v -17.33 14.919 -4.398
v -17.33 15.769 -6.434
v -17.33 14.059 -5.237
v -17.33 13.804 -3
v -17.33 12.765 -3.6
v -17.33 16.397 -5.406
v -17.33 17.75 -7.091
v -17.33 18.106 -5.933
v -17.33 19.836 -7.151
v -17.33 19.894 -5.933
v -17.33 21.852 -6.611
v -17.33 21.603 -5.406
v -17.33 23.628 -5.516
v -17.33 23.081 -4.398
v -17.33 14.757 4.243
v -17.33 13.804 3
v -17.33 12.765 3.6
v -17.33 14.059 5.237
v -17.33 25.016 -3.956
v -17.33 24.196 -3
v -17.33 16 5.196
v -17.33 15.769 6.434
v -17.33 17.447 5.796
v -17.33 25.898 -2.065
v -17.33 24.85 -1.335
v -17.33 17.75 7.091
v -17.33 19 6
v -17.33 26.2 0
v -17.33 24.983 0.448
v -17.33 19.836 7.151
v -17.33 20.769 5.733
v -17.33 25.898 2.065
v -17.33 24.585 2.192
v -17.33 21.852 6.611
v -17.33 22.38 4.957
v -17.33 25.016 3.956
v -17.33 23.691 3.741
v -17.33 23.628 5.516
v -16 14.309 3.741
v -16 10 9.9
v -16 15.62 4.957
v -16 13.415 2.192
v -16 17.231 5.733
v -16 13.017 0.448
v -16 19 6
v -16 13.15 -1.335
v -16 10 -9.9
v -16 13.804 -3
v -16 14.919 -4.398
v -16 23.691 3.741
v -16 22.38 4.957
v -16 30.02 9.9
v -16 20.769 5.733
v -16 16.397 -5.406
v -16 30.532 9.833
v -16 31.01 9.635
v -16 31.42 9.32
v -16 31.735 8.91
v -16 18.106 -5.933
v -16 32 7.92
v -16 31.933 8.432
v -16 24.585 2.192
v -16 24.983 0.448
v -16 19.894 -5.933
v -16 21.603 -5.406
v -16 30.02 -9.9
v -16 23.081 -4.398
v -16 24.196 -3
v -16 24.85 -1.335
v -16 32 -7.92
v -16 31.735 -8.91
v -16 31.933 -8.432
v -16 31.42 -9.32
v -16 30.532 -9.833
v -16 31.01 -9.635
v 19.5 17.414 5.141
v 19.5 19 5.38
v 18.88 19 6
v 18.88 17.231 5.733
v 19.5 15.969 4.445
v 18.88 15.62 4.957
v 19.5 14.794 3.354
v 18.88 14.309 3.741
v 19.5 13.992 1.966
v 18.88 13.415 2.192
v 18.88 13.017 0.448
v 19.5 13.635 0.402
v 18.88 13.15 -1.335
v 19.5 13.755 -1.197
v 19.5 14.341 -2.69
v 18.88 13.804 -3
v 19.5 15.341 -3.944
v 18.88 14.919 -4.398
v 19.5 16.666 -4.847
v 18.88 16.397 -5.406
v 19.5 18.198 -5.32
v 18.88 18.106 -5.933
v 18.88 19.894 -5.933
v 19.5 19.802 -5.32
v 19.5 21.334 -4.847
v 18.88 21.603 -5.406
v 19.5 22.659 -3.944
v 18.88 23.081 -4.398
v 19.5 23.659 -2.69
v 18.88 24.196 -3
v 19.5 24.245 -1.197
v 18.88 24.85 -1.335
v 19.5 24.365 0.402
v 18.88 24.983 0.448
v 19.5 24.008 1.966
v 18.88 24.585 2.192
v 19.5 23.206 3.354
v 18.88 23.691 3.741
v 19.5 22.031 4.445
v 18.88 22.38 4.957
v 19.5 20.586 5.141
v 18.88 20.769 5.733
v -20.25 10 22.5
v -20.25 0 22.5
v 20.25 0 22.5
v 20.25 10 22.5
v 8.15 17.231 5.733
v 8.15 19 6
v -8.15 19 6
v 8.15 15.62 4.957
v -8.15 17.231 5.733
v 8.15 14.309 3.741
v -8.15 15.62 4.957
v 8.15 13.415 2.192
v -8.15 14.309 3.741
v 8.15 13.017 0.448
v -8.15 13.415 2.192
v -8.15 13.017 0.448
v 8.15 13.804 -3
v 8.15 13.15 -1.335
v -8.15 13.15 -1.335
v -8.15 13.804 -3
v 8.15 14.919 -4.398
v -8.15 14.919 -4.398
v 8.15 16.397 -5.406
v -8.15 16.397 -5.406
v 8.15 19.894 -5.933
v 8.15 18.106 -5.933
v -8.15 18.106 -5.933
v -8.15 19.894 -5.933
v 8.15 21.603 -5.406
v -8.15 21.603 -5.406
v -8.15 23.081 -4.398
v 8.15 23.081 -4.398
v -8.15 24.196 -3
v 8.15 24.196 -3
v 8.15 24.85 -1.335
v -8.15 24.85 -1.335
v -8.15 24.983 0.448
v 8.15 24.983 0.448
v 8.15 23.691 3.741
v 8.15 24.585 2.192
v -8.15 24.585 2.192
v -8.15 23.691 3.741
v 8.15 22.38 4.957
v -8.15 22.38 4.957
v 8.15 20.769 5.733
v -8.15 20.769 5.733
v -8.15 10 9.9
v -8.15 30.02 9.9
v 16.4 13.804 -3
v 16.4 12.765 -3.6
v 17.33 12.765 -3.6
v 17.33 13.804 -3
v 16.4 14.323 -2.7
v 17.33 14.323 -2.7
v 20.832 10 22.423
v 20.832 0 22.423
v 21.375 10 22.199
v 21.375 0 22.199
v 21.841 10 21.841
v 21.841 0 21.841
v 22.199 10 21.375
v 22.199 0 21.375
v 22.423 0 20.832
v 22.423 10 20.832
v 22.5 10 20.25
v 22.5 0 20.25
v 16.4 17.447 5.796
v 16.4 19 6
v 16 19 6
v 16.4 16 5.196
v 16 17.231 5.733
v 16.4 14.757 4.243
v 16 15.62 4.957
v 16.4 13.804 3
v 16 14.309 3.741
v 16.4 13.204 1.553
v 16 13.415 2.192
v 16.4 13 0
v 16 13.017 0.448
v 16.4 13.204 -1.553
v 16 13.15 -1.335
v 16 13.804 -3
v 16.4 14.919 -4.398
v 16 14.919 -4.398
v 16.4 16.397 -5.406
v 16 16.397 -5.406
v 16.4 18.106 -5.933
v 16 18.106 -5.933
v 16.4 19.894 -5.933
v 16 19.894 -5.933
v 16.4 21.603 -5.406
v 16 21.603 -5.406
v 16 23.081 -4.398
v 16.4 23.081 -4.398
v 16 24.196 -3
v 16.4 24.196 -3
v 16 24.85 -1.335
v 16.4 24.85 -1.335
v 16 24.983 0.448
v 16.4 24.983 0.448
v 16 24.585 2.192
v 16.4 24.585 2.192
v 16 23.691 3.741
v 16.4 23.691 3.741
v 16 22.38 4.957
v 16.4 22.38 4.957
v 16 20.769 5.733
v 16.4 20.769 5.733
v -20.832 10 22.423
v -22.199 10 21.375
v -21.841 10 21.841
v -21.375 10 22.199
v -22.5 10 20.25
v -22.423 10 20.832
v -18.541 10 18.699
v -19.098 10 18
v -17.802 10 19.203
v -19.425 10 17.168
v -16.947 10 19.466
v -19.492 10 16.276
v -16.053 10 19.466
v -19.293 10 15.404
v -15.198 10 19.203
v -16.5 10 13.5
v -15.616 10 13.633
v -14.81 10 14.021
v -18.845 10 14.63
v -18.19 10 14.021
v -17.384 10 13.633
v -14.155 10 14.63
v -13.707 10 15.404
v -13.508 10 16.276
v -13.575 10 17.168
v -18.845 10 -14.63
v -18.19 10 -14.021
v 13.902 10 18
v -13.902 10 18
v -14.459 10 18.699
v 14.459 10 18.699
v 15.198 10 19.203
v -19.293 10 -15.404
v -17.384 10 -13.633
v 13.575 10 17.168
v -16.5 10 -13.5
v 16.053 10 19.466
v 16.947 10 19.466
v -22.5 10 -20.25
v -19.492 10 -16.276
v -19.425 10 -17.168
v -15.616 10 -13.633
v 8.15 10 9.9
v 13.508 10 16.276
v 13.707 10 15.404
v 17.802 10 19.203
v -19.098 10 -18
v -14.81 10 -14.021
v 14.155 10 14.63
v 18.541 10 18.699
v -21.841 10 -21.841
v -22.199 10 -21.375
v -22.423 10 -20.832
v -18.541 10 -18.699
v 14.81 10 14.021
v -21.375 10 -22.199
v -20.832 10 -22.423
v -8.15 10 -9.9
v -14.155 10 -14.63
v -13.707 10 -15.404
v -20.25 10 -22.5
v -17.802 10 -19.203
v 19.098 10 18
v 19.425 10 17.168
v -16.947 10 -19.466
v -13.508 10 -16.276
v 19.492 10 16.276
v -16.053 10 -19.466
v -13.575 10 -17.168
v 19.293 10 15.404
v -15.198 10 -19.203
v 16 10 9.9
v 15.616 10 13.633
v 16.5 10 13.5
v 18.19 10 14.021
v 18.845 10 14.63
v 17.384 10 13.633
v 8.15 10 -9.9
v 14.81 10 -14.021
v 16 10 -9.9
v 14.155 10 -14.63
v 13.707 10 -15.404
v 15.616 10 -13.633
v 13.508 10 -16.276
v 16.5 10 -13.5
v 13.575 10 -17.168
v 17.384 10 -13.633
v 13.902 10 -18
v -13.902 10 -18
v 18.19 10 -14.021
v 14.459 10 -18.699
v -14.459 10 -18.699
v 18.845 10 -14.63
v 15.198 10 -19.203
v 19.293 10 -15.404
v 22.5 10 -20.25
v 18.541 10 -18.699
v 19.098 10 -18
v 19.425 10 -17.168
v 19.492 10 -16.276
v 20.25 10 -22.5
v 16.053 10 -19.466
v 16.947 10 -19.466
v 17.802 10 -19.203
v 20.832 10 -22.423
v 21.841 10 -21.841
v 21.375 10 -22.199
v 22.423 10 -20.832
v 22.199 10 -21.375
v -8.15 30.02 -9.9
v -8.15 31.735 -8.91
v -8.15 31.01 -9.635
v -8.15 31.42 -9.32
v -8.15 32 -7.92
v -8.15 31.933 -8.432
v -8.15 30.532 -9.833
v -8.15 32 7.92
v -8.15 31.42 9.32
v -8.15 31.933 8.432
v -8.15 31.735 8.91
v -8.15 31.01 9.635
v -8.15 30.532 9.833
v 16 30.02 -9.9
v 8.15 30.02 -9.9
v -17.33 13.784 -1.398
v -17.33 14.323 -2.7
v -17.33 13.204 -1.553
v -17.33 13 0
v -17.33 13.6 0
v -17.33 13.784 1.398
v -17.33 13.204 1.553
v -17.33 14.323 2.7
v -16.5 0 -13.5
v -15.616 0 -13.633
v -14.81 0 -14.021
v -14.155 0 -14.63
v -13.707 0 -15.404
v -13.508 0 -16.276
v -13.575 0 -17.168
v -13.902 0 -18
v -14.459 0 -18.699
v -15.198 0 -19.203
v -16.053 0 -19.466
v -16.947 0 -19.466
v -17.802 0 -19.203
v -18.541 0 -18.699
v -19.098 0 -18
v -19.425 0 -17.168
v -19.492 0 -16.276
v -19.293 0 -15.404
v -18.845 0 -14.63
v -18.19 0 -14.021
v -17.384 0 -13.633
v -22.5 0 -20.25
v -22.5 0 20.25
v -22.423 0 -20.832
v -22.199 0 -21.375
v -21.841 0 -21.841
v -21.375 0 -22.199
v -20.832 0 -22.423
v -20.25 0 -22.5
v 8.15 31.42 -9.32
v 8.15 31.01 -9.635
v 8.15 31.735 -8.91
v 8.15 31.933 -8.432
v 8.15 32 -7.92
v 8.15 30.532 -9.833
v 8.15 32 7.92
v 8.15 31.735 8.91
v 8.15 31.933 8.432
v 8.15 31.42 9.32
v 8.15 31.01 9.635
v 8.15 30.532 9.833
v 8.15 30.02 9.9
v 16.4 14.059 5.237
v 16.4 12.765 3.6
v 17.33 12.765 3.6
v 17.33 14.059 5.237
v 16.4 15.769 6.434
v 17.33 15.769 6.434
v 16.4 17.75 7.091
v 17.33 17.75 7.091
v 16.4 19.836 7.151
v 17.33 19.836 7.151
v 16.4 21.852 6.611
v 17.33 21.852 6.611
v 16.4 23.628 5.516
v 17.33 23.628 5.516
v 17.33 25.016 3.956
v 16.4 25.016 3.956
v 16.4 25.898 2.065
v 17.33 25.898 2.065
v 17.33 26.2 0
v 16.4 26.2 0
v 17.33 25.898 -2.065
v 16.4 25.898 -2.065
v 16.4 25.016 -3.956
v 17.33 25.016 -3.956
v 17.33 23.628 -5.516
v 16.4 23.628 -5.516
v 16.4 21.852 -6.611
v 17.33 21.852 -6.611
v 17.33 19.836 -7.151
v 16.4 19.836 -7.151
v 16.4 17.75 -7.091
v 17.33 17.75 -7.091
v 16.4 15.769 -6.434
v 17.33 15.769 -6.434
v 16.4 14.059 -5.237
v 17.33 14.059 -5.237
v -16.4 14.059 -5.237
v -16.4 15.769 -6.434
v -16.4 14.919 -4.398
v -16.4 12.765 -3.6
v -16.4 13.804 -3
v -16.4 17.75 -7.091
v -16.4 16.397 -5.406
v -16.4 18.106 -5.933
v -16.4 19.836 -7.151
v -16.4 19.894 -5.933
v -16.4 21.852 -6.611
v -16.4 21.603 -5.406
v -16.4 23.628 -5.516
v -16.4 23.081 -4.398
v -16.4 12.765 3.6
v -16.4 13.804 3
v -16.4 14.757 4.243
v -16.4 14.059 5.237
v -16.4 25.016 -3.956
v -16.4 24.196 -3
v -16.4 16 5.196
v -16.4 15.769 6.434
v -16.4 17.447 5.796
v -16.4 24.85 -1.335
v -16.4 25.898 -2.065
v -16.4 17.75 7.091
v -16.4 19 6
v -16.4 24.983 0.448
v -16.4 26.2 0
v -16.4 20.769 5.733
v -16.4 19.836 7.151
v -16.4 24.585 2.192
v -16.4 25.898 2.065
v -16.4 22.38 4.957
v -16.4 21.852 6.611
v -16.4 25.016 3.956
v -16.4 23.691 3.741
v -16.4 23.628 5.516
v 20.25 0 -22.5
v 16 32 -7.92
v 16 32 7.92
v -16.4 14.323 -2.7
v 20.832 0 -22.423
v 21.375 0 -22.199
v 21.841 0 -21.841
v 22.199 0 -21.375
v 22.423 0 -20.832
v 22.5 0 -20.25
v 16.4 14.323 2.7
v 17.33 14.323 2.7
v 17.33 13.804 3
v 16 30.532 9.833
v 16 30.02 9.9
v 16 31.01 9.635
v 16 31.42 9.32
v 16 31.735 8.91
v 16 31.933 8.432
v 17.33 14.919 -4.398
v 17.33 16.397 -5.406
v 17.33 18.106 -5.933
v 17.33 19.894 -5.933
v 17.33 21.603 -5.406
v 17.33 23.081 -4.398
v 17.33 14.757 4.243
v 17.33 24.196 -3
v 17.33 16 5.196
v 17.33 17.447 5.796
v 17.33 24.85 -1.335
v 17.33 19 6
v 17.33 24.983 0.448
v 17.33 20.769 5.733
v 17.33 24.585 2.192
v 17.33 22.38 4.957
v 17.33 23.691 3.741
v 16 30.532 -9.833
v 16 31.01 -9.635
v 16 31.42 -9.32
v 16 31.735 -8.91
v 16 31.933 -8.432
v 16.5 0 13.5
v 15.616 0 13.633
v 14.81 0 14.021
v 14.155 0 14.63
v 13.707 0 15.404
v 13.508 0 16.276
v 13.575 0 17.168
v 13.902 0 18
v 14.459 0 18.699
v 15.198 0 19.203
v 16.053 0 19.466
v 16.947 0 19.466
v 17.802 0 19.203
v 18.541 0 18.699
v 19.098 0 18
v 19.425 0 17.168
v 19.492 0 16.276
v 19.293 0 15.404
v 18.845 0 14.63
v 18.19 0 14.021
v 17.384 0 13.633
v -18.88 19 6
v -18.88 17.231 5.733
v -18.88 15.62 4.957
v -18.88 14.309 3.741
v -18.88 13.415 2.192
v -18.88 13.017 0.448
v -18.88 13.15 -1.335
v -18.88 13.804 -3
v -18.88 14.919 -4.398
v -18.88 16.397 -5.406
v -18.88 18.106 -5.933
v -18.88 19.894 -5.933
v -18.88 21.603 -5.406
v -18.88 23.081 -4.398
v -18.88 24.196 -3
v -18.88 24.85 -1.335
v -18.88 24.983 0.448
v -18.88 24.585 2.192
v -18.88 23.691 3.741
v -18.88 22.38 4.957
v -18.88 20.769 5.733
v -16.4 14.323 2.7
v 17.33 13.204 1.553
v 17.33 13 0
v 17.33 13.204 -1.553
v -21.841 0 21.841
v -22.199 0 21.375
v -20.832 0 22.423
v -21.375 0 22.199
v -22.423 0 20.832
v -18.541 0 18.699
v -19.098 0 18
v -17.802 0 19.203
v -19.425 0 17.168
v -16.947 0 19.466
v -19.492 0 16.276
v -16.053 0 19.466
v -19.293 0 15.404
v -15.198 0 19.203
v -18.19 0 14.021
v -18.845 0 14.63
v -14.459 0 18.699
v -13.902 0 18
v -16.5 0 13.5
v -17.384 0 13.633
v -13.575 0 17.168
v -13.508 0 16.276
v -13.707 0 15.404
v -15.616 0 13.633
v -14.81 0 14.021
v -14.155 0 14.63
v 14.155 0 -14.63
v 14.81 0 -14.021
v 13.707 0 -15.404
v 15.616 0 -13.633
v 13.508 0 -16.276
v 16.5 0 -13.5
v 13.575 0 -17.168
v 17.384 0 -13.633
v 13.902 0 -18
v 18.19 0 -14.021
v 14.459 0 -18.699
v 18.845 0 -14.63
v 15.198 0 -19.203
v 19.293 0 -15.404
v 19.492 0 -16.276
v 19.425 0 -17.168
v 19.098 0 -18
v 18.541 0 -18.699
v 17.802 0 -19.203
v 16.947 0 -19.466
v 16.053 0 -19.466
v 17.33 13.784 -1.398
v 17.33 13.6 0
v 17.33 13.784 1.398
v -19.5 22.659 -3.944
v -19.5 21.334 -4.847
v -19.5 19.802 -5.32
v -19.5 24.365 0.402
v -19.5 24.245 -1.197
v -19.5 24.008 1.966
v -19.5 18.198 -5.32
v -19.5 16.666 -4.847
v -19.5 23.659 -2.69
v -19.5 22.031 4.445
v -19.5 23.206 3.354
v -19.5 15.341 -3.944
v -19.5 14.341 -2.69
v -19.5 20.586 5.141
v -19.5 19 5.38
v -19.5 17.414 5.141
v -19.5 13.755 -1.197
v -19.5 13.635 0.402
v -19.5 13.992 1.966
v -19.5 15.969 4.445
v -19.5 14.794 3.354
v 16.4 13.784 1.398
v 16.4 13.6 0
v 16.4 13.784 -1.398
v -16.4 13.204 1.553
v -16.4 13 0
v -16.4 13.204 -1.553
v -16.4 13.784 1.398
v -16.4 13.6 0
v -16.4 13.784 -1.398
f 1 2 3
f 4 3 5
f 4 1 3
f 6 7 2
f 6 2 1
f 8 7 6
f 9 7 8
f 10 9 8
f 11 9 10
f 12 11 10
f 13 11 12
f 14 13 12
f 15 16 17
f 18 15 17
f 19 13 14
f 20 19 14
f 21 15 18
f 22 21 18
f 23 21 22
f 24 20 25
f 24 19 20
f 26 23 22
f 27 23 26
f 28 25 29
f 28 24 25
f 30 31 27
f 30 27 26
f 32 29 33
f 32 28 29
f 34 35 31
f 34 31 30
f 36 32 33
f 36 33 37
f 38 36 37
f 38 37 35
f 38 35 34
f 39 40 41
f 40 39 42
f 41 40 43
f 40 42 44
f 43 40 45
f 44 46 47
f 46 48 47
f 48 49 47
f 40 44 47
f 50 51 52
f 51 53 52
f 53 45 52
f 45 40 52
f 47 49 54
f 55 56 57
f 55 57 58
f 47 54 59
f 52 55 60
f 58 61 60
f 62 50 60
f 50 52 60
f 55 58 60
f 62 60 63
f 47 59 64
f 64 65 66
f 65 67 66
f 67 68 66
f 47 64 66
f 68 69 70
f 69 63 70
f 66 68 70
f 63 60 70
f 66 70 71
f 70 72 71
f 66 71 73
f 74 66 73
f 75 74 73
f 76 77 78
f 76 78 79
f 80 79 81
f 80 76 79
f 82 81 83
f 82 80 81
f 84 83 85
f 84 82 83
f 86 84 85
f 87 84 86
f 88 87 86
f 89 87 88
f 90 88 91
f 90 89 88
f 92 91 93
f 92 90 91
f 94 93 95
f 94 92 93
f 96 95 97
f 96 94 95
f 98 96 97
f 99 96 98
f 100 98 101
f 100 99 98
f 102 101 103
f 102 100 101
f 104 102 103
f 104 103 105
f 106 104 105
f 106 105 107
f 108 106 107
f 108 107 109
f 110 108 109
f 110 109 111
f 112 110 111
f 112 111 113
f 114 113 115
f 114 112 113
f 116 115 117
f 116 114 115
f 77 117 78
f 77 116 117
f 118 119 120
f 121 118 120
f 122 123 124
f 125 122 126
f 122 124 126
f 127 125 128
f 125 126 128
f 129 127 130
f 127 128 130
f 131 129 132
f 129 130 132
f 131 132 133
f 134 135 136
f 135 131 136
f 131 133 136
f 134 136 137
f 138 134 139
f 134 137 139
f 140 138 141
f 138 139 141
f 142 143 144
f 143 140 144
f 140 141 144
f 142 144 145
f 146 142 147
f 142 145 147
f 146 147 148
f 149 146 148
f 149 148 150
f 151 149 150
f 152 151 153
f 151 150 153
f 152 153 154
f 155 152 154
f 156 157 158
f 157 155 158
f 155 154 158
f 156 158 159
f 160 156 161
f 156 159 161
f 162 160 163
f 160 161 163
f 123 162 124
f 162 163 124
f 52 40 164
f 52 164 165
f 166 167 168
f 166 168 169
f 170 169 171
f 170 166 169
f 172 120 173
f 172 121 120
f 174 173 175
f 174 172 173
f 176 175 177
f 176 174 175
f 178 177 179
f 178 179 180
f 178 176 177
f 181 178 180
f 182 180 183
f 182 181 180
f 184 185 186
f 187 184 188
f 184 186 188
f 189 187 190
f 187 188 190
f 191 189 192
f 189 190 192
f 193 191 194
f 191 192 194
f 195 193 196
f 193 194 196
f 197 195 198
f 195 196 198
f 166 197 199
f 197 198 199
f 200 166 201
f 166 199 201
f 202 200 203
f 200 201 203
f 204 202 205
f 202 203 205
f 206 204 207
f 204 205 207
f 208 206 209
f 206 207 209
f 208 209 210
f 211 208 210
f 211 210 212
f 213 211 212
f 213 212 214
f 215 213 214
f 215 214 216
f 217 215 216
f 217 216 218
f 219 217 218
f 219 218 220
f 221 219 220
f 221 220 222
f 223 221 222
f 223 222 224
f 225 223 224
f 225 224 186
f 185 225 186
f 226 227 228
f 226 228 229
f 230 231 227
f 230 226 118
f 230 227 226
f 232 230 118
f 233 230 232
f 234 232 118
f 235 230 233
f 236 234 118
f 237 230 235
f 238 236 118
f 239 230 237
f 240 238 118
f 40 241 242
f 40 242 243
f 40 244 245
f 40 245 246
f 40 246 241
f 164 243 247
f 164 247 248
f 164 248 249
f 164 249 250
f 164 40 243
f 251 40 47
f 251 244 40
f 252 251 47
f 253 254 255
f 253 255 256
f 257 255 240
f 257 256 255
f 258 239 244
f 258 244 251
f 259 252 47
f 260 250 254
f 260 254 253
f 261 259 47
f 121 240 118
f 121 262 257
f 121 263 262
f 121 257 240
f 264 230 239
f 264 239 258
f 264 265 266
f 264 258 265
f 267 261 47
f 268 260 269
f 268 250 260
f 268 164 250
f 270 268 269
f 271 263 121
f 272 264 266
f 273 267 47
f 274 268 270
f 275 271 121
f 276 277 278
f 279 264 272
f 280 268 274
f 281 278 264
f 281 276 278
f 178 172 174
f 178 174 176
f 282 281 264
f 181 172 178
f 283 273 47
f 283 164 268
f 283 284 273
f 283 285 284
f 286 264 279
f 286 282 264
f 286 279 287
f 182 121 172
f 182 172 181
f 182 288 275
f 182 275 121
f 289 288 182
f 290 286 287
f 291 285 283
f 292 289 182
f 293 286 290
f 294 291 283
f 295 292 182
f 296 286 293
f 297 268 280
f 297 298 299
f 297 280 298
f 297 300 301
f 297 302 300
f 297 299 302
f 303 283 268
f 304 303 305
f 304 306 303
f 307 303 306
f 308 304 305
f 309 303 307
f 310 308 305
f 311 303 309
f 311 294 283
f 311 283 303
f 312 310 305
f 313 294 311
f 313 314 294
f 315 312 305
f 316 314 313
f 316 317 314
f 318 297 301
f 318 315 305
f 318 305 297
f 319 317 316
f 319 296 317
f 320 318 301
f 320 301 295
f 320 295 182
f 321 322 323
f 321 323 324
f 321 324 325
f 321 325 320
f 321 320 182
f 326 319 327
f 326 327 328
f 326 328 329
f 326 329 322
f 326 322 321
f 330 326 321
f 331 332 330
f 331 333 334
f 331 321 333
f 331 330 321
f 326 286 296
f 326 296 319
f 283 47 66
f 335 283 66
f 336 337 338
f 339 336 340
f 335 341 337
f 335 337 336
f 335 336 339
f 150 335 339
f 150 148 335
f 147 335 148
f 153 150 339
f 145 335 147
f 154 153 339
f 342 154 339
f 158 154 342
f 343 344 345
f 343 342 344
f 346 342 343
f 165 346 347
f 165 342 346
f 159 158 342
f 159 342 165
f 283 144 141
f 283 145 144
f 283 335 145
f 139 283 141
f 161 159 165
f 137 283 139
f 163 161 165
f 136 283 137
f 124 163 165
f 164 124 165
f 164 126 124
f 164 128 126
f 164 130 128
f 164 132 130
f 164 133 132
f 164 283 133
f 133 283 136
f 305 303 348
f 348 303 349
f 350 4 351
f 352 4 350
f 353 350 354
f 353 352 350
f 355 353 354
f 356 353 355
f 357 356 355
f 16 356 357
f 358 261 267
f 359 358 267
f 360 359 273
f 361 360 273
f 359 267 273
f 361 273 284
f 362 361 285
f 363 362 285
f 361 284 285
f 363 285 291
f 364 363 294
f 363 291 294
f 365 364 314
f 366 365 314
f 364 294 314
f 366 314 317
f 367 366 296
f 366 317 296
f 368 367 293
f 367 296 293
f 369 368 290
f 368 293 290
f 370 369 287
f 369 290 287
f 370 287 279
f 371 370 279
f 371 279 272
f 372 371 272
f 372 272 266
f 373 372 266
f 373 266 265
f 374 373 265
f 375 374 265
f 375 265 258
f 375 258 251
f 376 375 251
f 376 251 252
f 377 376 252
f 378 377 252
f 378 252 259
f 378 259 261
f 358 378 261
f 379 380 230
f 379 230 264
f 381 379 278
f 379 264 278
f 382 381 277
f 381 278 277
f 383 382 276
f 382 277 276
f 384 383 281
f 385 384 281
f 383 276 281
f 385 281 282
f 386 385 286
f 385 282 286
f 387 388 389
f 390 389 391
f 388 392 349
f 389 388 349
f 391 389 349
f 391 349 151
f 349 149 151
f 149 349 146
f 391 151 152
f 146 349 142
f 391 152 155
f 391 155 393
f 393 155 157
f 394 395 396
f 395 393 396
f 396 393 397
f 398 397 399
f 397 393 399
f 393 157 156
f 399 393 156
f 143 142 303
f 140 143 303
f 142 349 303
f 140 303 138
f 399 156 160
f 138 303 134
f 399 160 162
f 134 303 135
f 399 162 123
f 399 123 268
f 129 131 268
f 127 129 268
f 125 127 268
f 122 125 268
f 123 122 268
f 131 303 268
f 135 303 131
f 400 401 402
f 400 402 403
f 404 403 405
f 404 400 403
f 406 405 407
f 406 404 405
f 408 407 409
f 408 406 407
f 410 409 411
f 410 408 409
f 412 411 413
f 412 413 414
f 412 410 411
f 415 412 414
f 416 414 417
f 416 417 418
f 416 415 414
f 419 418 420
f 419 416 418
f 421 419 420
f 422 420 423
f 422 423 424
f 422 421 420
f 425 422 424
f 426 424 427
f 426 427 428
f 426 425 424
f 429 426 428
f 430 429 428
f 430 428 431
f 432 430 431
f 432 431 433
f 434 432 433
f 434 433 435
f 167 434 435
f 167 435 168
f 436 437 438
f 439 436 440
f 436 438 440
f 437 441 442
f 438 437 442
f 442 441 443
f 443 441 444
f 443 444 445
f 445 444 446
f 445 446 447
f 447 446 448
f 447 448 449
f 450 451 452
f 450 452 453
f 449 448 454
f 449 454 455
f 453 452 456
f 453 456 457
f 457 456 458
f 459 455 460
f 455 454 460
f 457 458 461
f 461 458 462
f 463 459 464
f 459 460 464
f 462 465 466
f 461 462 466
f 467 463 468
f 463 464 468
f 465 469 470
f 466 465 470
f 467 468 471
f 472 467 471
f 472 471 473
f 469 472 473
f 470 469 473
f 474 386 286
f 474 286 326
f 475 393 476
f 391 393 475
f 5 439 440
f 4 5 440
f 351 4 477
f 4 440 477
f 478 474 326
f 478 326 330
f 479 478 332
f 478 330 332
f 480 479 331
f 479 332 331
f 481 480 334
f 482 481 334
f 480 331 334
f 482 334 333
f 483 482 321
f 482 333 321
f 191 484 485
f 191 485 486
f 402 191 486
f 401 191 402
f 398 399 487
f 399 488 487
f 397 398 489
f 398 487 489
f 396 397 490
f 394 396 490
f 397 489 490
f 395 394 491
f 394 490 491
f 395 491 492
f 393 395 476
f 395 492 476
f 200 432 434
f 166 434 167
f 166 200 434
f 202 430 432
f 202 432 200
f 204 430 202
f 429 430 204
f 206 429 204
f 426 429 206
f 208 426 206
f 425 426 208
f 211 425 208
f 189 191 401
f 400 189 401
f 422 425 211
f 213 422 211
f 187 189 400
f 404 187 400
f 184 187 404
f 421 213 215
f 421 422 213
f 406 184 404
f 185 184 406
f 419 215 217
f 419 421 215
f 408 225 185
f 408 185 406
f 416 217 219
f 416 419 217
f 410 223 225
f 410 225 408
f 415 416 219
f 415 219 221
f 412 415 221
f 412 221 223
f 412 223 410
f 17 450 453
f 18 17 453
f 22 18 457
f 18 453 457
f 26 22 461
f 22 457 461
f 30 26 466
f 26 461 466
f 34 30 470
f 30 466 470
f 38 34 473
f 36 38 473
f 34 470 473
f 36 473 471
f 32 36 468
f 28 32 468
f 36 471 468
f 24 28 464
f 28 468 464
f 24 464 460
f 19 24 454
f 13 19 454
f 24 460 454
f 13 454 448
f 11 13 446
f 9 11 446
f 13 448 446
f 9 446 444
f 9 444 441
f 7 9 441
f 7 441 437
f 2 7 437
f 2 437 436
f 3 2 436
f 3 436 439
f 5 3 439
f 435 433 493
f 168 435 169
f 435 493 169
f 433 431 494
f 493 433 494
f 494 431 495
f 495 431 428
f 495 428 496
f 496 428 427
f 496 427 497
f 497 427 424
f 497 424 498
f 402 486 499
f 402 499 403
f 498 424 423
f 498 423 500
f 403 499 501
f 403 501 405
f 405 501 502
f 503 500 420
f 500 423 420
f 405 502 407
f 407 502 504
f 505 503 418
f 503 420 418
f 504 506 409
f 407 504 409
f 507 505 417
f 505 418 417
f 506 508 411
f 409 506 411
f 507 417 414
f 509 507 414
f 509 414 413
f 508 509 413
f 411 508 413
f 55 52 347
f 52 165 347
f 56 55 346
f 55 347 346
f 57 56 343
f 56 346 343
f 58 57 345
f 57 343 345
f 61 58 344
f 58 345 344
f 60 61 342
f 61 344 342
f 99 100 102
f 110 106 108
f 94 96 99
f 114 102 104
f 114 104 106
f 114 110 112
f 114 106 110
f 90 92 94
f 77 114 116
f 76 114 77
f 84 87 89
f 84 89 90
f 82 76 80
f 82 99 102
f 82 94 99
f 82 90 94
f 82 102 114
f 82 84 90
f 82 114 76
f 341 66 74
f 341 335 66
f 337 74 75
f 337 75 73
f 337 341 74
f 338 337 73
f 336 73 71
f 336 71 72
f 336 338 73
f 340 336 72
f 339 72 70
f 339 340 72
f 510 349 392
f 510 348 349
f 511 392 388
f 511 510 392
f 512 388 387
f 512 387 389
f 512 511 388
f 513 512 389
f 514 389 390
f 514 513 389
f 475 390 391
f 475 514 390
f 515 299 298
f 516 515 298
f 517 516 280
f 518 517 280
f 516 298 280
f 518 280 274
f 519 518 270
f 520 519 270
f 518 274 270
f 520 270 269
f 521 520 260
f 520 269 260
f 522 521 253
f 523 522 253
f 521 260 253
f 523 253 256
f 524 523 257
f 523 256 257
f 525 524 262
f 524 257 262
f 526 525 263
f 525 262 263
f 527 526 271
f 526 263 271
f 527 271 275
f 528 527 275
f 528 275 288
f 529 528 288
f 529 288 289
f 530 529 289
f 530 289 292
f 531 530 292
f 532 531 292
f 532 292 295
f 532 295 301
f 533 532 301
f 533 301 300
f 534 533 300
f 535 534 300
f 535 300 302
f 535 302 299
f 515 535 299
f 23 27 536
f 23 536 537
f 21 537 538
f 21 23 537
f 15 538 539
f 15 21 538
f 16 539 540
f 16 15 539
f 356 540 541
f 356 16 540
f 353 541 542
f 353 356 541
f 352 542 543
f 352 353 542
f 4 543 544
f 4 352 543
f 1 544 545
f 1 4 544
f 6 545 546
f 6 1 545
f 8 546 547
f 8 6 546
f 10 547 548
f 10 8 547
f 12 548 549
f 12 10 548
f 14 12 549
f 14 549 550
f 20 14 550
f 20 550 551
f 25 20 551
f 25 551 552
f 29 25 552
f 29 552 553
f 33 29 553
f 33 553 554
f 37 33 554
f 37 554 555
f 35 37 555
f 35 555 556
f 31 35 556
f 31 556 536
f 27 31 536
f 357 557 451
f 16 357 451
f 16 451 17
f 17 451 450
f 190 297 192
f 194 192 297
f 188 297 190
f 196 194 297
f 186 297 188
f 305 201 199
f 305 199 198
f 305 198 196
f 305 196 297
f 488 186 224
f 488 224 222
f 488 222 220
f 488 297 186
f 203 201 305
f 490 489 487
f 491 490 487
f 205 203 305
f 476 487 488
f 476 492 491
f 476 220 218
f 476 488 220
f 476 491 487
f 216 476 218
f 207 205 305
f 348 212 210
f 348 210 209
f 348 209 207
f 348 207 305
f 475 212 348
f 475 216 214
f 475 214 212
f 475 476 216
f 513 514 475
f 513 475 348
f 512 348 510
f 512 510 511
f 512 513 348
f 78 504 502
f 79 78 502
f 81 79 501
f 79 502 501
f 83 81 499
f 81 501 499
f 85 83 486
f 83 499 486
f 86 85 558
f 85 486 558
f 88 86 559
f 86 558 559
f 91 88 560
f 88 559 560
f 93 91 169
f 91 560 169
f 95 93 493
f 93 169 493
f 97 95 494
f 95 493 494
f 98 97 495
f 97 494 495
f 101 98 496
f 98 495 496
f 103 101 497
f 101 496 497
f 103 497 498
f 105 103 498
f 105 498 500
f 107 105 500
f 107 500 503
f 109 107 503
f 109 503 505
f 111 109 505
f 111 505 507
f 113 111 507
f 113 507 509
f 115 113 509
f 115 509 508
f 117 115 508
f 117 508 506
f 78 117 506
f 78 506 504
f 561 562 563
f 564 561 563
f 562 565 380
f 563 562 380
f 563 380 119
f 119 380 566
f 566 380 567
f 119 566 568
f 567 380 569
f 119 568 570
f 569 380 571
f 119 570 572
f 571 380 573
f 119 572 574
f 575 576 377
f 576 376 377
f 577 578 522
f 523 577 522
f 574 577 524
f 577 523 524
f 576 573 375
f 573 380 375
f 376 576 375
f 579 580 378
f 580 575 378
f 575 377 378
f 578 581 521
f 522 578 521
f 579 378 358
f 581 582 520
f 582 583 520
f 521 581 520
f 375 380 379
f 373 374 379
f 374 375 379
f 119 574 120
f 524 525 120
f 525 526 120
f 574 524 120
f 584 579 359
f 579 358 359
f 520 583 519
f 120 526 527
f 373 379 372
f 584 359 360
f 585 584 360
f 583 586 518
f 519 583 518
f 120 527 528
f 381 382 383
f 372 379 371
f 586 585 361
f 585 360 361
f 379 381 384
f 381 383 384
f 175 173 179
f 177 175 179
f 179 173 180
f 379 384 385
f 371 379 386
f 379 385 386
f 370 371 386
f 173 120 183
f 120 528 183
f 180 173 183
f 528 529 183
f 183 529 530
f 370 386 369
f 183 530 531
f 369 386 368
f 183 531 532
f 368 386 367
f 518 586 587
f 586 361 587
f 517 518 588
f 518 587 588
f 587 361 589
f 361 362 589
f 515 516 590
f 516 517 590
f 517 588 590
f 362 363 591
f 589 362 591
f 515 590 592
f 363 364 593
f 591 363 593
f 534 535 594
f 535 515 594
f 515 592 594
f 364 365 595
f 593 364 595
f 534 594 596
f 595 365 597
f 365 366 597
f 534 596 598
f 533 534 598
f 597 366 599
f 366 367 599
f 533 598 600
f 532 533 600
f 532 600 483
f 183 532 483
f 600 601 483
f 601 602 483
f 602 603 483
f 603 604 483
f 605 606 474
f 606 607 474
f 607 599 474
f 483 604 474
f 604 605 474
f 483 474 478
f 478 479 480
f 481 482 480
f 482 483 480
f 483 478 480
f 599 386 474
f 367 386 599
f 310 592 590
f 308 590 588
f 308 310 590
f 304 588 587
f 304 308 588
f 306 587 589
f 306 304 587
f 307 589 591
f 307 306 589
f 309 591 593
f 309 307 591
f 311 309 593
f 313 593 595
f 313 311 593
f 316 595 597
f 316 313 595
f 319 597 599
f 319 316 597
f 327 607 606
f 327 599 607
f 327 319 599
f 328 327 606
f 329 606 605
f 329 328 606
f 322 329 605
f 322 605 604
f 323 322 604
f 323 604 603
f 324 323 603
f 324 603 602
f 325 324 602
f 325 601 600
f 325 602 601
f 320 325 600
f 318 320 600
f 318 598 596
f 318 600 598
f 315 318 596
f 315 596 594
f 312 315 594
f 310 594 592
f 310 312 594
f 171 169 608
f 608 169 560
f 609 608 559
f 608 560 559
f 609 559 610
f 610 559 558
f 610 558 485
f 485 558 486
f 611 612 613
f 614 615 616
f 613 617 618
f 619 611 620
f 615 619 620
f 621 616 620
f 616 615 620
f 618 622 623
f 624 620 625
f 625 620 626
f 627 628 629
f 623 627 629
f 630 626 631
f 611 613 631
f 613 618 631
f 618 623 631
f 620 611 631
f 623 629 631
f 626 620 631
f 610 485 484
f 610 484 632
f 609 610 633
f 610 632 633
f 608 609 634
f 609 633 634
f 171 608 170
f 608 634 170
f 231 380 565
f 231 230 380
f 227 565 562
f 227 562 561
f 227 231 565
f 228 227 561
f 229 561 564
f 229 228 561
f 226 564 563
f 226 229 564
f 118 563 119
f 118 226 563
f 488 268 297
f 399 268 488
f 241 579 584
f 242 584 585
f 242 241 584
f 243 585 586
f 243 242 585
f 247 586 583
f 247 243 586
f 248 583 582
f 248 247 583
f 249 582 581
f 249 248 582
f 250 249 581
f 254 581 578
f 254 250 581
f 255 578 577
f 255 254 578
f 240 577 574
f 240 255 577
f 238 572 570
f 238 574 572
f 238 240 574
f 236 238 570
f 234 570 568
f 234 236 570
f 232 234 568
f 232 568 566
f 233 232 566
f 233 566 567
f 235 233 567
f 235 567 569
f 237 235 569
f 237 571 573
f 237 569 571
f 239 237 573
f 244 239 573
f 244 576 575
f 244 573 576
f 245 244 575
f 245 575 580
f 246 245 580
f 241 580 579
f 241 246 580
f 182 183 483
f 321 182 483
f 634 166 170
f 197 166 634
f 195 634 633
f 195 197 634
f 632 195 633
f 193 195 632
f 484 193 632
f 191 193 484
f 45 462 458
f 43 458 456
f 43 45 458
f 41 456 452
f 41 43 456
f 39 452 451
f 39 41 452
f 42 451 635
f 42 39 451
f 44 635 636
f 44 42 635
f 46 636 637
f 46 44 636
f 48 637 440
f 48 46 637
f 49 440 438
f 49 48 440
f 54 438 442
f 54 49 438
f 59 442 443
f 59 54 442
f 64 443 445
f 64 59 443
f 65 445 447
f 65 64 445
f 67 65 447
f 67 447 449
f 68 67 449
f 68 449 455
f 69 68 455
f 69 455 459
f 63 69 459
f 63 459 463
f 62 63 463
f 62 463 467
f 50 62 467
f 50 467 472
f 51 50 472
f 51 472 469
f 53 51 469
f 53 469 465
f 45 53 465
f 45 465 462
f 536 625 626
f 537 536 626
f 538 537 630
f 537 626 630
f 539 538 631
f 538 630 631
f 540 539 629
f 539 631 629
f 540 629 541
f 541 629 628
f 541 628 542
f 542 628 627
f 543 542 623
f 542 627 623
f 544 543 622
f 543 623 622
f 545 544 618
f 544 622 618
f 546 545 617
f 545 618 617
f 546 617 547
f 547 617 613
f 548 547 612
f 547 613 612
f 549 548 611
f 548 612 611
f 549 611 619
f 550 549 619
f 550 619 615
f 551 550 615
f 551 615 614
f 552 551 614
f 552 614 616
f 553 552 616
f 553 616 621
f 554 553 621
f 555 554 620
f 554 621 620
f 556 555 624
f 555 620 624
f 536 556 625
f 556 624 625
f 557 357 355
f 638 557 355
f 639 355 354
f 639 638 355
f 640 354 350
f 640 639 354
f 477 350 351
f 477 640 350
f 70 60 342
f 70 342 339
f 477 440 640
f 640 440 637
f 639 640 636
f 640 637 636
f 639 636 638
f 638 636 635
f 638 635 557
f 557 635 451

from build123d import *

# Parameters (mm, degrees)
SKETCH_3_W               = 45
SKETCH_3_H               = 45
EXTRUDE_1_DEPTH          = 10
EXTRUDE_START            = -38.5
SKETCH_4_W               = 19.8
SKETCH_4_H               = 22
EXTRUDE_2_DEPTH          = 32
SKETCH_5_W               = 16.3
SKETCH_5_H               = 19.8
CUT_EXTRUDE_1_DEPTH      = 22
SKETCH_6_R               = 6
EXTRUDE_3_DEPTH          = 19.5
CUT_EXTRUDE_START        = -3.1
SKETCH_7_R               = 6
SKETCH_7_R_2             = 5.4
CUT_EXTRUDE_3_DEPTH      = 0.93
SKETCH_8_R               = 3
CUT_EXTRUDE_4_DEPTH      = 39.684622268
MIRROR_4_COPY_1_SKETCH_R = 3
MIRROR_4_COPY_1_DEPTH    = 39.684622268
EXTRUDE_4_DEPTH          = 0.93
FILLET_1_R               = 2.25
FILLET_2_R               = 1.98
CHAMFER_1_SIZE           = 0.62


with BuildPart() as part:
    # 草图3 → 凸台-拉伸1 (new body)
    with BuildSketch(Plane(origin=(0, 0, 0), x_dir=(1, 0, 0), z_dir=(0, 1, 0))):
        Rectangle(SKETCH_3_W, SKETCH_3_H)
    extrude(amount=EXTRUDE_1_DEPTH)

    # 草图4 → 凸台-拉伸2 (add)
    with BuildSketch(Plane(origin=(22.5, 0, 0), x_dir=(0, 0, -1), z_dir=(1, 0, 0)).offset(EXTRUDE_START)):
        with Locations((0, 21)):
            Rectangle(SKETCH_4_W, SKETCH_4_H)
    extrude(amount=EXTRUDE_2_DEPTH)

    # 草图5 → 切除-拉伸1 (cut)
    with BuildSketch(Plane(origin=(0, 10, 0), x_dir=(-1, 0, 0), z_dir=(0, 1, 0))):
        Rectangle(SKETCH_5_W, SKETCH_5_H)
    extrude(amount=CUT_EXTRUDE_1_DEPTH, mode=Mode.SUBTRACT)

    # 草图6 → 凸台-拉伸3 (add)
    with BuildSketch(Plane(origin=(0, 0, 0), x_dir=(0, 0, -1), z_dir=(1, 0, 0))):
        with Locations(Location((0, 19, 0), (0, 0, 180))):
            Circle(SKETCH_6_R)
    extrude_3 = extrude(amount=EXTRUDE_3_DEPTH)

    # 镜向1: 凸台-拉伸3 across plane
    add(extrude_3.mirror(Plane(origin=(0, 0, 0), x_dir=(0, 0, 1), z_dir=(1, 0, 0))))

    # 草图7 → 切除-拉伸3 (cut)
    with BuildSketch(Plane(origin=(19.5, 0, 0), x_dir=(0, 0, -1), z_dir=(1, 0, 0)).offset(CUT_EXTRUDE_START)):
        with Locations(Location((0, 19, 0), (0, 0, 180))):
            Circle(SKETCH_7_R)
        with Locations((0, 19)):
            Circle(SKETCH_7_R_2, mode=Mode.SUBTRACT)
    cut_extrude_3 = extrude(amount=CUT_EXTRUDE_3_DEPTH, mode=Mode.SUBTRACT)

    # 镜向2: 切除-拉伸3 across plane
    add(cut_extrude_3.mirror(Plane(origin=(0, 0, 0), x_dir=(0, 0, 1), z_dir=(1, 0, 0))), mode=Mode.SUBTRACT)

    # 草图8 → 切除-拉伸4 (cut, through all)
    with BuildSketch(Plane(origin=(0, 10, 0), x_dir=(1, 0, 0), z_dir=(0, 1, 0))):
        with Locations(Location((-16.5, 16.5, 0), (0, 0, 270))):
            Circle(SKETCH_8_R)
    cut_extrude_4 = extrude(amount=-CUT_EXTRUDE_4_DEPTH, mode=Mode.SUBTRACT)

    # 镜向3: 切除-拉伸4 across plane
    add(cut_extrude_4.mirror(Plane(origin=(0, 0, 0), x_dir=(0, 0, 1), z_dir=(1, 0, 0))), mode=Mode.SUBTRACT)

    # 镜向4: 切除-拉伸4 across plane
    add(cut_extrude_4.mirror(Plane.XY), mode=Mode.SUBTRACT)

    # 镜向4 copy 1 sketch → 镜向4 copy 1 (cut, through all)
    with BuildSketch(Plane(origin=(0, 10, 0), x_dir=(-1, 0, 0), z_dir=(0, 1, 0))):
        with Locations(Location((-16.5, 16.5, 0), (0, 0, 270))):
            Circle(MIRROR_4_COPY_1_SKETCH_R)
    extrude(amount=-MIRROR_4_COPY_1_DEPTH, mode=Mode.SUBTRACT)

    # 草图9 → 凸台-拉伸4 (add)
    with BuildSketch(Plane(origin=(16.4, 0, 0), x_dir=(0, 0, -1), z_dir=(1, 0, 0))):
        with BuildLine():
            Line((0, 19), (-3.6, 12.764617093))
            ThreePointArc((-3.6, 12.764617093), (0, 26.2), (3.6, 12.764617093))
            Line((3.6, 12.764617093), (0, 19))
        make_face()
    extrude_4 = extrude(amount=EXTRUDE_4_DEPTH)

    # 镜向5: 凸台-拉伸4 across plane
    add(extrude_4.mirror(Plane(origin=(0, 0, 0), x_dir=(0, 0, 1), z_dir=(1, 0, 0))))

    # 圆角1
    fillet_1_edges = [part.edges().sort_by_distance(p)[0] for p in [
        (-22.5, 5, 22.5),
        (-22.5, 5, -22.5),
        (22.5, 5, -22.5),
        (22.5, 5, 22.5),
    ]]
    fillet(fillet_1_edges, radius=FILLET_1_R)

    # 圆角2
    fillet_2_edges = [part.edges().sort_by_distance(p)[0] for p in [
        (12.075, 32, -9.9),
        (12.075, 32, 9.9),
        (-12.075, 32, 9.9),
        (-12.075, 32, -9.9),
    ]]
    fillet(fillet_2_edges, radius=FILLET_2_R)

    # 倒角1
    chamfer_1_edges = [part.edges().sort_by_distance(p)[0] for p in [
        (19.5, 19, -6),
        (-19.5, 19, -6),
    ]]
    chamfer(chamfer_1_edges, length=CHAMFER_1_SIZE)


solid = part.part
